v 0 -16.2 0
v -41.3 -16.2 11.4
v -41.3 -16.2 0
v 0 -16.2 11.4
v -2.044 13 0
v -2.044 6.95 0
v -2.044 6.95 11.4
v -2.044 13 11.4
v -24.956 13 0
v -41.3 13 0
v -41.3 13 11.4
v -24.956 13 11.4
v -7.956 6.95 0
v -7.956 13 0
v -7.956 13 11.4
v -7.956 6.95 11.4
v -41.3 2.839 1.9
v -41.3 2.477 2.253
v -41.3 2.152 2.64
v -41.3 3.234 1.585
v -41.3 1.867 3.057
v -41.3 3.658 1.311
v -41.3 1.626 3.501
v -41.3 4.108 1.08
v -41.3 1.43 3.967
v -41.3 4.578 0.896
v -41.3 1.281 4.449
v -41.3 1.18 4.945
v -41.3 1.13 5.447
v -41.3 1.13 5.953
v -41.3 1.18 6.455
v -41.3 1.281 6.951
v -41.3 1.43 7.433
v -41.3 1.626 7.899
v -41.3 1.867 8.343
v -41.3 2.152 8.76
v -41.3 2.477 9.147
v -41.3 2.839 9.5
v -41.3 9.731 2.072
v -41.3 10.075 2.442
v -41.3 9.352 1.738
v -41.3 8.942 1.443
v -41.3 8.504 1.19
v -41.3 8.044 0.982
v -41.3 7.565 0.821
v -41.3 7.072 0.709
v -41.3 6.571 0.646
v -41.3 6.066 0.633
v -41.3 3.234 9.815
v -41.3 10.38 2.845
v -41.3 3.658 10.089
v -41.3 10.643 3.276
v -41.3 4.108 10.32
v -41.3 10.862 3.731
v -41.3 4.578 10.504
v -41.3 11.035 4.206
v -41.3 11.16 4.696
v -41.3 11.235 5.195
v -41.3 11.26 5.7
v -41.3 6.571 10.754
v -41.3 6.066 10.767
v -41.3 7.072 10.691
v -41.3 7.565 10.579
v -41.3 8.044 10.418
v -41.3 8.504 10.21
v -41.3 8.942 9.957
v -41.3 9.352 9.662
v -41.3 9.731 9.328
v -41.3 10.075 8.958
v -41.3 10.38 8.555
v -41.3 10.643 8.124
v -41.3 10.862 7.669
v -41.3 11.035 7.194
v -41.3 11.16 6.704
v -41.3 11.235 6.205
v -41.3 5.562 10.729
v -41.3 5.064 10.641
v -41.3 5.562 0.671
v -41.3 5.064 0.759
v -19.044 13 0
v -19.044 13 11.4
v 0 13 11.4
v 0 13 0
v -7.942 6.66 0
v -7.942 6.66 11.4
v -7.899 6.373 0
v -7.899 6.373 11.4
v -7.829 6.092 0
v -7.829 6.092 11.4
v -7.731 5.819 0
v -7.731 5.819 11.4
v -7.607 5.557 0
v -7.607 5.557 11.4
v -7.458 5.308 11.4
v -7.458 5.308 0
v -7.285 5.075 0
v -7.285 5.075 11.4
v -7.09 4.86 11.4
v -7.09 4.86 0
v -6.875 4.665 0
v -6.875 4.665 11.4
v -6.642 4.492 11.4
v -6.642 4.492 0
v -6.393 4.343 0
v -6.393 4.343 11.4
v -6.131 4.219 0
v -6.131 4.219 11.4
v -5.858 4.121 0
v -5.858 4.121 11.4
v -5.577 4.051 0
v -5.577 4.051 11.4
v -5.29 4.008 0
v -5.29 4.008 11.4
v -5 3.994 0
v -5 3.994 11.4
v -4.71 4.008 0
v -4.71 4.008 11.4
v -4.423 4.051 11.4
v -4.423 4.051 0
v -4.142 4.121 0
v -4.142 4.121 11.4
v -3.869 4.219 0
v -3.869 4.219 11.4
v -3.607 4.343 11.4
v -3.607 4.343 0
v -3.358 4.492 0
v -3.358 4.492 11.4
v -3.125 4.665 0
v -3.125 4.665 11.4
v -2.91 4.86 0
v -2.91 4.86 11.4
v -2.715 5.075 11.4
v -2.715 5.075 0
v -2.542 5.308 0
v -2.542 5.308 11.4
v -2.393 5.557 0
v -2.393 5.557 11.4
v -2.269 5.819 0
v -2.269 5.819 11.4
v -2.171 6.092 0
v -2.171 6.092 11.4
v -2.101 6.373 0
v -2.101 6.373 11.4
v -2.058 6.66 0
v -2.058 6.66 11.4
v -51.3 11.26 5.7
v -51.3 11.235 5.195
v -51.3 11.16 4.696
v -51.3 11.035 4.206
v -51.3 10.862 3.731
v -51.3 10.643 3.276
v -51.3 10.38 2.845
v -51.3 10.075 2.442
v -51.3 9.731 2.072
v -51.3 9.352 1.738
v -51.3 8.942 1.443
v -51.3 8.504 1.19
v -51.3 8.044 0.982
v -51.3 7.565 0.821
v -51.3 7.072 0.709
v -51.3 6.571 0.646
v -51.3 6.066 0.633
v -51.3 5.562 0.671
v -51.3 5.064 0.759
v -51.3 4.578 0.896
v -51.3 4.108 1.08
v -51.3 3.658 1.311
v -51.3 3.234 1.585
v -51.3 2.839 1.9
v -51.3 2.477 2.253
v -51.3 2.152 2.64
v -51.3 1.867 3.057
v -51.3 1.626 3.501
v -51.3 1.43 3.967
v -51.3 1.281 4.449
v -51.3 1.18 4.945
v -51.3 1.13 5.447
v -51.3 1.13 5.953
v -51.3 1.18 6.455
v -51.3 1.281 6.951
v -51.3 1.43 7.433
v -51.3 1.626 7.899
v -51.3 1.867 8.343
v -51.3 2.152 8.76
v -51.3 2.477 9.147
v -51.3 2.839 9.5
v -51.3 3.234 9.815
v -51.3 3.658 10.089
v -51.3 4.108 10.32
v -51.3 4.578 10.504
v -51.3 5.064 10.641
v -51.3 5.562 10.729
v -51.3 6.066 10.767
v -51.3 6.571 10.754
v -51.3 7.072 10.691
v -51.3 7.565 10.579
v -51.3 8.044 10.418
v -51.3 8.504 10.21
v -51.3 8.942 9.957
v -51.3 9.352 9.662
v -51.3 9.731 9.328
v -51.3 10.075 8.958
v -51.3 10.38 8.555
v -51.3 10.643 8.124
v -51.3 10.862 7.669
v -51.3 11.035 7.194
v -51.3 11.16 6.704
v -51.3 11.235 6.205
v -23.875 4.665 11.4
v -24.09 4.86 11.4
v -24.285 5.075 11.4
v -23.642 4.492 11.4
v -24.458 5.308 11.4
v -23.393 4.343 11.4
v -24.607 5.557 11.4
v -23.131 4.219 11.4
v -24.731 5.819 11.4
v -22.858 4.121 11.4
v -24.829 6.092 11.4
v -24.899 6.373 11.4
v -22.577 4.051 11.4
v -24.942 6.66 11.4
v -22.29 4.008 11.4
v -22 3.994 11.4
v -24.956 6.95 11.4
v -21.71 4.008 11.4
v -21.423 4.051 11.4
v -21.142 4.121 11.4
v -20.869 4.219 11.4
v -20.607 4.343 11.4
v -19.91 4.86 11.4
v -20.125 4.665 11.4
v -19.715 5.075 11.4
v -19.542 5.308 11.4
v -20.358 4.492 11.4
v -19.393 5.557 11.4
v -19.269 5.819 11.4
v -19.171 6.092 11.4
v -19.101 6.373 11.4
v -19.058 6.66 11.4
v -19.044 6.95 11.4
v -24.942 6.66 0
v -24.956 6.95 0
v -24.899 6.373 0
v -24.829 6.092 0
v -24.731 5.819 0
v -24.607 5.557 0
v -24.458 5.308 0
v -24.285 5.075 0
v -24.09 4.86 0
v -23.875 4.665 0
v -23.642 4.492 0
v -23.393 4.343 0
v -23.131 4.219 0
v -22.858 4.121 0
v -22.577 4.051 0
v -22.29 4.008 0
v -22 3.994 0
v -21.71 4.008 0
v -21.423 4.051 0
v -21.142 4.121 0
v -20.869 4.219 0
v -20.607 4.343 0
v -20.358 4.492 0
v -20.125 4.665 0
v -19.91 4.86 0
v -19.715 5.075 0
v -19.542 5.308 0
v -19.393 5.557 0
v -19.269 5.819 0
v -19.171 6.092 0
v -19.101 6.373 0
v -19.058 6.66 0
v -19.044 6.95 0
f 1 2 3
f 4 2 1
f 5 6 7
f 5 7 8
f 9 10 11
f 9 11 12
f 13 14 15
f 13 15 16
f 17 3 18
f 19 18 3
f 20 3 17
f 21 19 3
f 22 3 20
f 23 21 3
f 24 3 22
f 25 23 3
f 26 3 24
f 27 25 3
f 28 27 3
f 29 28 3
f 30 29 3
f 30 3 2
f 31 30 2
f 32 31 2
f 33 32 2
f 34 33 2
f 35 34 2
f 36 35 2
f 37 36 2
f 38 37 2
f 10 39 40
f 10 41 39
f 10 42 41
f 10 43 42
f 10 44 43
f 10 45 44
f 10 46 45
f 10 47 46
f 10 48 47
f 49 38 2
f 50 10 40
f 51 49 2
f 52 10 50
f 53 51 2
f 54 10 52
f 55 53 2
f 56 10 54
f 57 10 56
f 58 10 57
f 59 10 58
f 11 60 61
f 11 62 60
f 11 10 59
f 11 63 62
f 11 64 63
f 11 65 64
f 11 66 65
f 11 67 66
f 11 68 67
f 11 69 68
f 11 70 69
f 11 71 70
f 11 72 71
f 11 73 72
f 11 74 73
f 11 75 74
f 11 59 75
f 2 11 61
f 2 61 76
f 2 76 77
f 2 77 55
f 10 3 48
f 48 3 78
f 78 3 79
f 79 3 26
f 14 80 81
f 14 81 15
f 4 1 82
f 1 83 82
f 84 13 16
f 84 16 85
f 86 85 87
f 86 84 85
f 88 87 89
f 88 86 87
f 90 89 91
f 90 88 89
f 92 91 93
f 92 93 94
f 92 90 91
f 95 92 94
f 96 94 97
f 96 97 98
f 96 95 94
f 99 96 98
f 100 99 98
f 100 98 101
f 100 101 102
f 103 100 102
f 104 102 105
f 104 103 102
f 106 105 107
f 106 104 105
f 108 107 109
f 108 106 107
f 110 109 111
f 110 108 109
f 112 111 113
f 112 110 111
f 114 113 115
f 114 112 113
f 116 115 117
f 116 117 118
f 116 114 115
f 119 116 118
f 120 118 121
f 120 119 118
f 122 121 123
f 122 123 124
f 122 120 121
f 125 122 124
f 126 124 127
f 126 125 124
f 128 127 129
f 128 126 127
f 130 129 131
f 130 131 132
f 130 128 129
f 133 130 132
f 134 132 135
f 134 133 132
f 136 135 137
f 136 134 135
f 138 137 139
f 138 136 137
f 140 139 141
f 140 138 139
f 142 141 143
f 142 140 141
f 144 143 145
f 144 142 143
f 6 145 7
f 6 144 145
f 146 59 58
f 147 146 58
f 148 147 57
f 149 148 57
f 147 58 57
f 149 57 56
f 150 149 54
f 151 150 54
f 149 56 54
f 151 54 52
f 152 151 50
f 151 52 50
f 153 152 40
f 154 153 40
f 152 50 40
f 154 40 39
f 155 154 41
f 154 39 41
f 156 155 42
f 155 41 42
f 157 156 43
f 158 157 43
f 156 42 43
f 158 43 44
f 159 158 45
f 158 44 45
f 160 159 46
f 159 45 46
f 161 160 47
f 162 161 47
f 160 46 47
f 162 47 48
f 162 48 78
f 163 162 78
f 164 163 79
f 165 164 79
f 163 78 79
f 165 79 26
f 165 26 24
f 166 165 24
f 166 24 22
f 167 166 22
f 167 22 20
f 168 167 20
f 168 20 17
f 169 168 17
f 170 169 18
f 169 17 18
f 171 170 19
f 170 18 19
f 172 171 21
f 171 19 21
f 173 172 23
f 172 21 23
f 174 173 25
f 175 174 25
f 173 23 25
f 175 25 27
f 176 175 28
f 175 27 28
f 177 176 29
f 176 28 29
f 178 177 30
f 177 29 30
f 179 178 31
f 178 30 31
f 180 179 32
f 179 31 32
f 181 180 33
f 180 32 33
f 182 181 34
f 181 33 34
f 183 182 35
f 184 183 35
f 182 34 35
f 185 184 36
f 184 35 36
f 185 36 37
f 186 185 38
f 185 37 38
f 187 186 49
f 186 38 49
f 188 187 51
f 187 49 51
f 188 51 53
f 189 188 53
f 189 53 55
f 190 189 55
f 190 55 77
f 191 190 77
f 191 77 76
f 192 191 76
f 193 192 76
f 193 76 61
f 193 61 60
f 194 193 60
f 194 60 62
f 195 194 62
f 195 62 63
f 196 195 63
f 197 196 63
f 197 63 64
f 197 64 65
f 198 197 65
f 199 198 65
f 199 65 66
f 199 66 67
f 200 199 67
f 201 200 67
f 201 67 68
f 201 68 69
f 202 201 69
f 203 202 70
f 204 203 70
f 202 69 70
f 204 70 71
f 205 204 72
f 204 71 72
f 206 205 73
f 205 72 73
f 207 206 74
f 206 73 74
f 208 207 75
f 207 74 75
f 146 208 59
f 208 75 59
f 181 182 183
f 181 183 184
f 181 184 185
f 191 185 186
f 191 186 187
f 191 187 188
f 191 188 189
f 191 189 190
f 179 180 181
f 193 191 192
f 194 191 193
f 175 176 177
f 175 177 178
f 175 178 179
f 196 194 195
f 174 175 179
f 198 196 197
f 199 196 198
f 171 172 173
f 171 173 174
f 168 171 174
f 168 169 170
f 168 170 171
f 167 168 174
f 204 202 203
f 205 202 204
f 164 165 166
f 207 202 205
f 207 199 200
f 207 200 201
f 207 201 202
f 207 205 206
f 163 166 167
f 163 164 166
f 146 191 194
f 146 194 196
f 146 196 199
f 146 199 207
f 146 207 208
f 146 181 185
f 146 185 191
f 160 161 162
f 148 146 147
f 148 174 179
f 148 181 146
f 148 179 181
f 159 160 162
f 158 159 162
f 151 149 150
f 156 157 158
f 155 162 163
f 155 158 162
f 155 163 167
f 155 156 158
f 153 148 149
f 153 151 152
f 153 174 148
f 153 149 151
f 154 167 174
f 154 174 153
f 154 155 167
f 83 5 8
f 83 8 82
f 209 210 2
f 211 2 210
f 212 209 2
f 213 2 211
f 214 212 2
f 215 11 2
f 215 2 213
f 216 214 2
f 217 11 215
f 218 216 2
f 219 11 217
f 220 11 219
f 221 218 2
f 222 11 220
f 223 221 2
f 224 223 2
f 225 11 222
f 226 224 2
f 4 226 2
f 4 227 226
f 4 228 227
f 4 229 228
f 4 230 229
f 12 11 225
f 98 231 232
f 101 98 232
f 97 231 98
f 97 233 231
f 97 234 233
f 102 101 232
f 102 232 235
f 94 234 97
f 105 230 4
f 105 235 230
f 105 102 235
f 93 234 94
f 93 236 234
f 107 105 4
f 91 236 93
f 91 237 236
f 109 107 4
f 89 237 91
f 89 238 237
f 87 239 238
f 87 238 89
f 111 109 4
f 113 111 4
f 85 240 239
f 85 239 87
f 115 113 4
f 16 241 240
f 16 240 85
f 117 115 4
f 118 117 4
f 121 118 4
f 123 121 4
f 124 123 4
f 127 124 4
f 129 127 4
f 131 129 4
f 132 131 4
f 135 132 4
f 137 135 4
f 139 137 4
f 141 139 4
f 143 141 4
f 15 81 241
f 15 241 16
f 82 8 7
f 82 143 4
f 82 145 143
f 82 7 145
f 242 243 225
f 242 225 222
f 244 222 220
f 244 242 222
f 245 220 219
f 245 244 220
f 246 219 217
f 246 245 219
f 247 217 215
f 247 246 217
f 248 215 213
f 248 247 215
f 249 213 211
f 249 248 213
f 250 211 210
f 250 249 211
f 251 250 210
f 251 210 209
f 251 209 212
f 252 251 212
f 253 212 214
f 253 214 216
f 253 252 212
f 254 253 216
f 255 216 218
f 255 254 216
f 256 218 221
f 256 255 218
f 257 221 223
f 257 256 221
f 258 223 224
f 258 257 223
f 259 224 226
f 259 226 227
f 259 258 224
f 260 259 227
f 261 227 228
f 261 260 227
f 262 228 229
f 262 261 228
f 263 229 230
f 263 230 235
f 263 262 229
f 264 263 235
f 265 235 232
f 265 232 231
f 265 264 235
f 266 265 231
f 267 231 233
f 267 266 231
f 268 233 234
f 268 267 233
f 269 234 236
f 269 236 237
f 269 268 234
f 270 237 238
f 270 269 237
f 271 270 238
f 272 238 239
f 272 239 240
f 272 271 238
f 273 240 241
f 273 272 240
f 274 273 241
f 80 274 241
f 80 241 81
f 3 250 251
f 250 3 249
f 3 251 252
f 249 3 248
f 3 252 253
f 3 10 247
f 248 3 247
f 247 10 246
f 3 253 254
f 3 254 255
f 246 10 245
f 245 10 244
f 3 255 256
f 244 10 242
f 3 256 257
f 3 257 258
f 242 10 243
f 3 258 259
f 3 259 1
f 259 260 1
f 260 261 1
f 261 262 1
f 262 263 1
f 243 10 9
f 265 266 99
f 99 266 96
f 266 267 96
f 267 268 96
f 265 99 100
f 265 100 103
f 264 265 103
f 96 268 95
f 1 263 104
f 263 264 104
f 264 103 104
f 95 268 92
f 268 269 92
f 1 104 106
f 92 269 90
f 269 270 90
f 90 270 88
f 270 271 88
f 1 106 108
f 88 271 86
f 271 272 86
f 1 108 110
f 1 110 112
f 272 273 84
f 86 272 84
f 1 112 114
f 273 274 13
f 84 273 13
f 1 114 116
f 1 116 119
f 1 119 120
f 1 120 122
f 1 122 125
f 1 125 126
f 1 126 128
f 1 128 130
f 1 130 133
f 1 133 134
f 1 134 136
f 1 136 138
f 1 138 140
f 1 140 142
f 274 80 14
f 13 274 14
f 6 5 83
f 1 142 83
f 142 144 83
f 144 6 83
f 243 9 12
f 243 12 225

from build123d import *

# Parameters (mm, degrees)
BOSS_EXTRUDE1_DEPTH = 11.4
SKETCH2_W           = 41.3
SKETCH2_H           = 11.4
BOSS_EXTRUDE2_DEPTH = 16.2
SKETCH3_R           = 5.068211815
BOSS_EXTRUDE3_DEPTH = 10


with BuildPart() as part:
    # Sketch1 → Boss-Extrude1 (new body)
    with BuildSketch(Plane.XY):
        with BuildLine():
            Line((0, 0), (-41.3, 0))
            Line((-41.3, 0), (-41.3, 13))
            Line((-41.3, 13), (-24.95603272, 13))
            Line((-24.95603272, 13), (-24.95603272, 6.95))
            ThreePointArc((-24.95603272, 6.95), (-22, 3.99396728), (-19.04396728, 6.95))
            Line((-19.04396728, 6.95), (-19.04396728, 13))
            Line((-19.04396728, 13), (-7.95603272, 13))
            Line((-7.95603272, 13), (-7.95603272, 6.95))
            ThreePointArc((-7.95603272, 6.95), (-5, 3.99396728), (-2.04396728, 6.95))
            Line((-2.04396728, 6.95), (-2.04396728, 13))
            Line((-2.04396728, 13), (0, 13))
            Line((0, 13), (0, 0))
        make_face()
    extrude(amount=BOSS_EXTRUDE1_DEPTH)

    # Sketch2 → Boss-Extrude2 (add)
    with BuildSketch(Plane.XZ):
        with Locations((-20.65, 5.7)):
            Rectangle(SKETCH2_W, SKETCH2_H)
    extrude(amount=BOSS_EXTRUDE2_DEPTH)

    # Sketch3 → Boss-Extrude3 (add)
    with BuildSketch(Plane.ZY.offset(41.3)):
        with Locations(Location((5.7, 6.192096644, 0), (0, 0, 90))):
            Circle(SKETCH3_R)
    extrude(amount=BOSS_EXTRUDE3_DEPTH)


solid = part.part
